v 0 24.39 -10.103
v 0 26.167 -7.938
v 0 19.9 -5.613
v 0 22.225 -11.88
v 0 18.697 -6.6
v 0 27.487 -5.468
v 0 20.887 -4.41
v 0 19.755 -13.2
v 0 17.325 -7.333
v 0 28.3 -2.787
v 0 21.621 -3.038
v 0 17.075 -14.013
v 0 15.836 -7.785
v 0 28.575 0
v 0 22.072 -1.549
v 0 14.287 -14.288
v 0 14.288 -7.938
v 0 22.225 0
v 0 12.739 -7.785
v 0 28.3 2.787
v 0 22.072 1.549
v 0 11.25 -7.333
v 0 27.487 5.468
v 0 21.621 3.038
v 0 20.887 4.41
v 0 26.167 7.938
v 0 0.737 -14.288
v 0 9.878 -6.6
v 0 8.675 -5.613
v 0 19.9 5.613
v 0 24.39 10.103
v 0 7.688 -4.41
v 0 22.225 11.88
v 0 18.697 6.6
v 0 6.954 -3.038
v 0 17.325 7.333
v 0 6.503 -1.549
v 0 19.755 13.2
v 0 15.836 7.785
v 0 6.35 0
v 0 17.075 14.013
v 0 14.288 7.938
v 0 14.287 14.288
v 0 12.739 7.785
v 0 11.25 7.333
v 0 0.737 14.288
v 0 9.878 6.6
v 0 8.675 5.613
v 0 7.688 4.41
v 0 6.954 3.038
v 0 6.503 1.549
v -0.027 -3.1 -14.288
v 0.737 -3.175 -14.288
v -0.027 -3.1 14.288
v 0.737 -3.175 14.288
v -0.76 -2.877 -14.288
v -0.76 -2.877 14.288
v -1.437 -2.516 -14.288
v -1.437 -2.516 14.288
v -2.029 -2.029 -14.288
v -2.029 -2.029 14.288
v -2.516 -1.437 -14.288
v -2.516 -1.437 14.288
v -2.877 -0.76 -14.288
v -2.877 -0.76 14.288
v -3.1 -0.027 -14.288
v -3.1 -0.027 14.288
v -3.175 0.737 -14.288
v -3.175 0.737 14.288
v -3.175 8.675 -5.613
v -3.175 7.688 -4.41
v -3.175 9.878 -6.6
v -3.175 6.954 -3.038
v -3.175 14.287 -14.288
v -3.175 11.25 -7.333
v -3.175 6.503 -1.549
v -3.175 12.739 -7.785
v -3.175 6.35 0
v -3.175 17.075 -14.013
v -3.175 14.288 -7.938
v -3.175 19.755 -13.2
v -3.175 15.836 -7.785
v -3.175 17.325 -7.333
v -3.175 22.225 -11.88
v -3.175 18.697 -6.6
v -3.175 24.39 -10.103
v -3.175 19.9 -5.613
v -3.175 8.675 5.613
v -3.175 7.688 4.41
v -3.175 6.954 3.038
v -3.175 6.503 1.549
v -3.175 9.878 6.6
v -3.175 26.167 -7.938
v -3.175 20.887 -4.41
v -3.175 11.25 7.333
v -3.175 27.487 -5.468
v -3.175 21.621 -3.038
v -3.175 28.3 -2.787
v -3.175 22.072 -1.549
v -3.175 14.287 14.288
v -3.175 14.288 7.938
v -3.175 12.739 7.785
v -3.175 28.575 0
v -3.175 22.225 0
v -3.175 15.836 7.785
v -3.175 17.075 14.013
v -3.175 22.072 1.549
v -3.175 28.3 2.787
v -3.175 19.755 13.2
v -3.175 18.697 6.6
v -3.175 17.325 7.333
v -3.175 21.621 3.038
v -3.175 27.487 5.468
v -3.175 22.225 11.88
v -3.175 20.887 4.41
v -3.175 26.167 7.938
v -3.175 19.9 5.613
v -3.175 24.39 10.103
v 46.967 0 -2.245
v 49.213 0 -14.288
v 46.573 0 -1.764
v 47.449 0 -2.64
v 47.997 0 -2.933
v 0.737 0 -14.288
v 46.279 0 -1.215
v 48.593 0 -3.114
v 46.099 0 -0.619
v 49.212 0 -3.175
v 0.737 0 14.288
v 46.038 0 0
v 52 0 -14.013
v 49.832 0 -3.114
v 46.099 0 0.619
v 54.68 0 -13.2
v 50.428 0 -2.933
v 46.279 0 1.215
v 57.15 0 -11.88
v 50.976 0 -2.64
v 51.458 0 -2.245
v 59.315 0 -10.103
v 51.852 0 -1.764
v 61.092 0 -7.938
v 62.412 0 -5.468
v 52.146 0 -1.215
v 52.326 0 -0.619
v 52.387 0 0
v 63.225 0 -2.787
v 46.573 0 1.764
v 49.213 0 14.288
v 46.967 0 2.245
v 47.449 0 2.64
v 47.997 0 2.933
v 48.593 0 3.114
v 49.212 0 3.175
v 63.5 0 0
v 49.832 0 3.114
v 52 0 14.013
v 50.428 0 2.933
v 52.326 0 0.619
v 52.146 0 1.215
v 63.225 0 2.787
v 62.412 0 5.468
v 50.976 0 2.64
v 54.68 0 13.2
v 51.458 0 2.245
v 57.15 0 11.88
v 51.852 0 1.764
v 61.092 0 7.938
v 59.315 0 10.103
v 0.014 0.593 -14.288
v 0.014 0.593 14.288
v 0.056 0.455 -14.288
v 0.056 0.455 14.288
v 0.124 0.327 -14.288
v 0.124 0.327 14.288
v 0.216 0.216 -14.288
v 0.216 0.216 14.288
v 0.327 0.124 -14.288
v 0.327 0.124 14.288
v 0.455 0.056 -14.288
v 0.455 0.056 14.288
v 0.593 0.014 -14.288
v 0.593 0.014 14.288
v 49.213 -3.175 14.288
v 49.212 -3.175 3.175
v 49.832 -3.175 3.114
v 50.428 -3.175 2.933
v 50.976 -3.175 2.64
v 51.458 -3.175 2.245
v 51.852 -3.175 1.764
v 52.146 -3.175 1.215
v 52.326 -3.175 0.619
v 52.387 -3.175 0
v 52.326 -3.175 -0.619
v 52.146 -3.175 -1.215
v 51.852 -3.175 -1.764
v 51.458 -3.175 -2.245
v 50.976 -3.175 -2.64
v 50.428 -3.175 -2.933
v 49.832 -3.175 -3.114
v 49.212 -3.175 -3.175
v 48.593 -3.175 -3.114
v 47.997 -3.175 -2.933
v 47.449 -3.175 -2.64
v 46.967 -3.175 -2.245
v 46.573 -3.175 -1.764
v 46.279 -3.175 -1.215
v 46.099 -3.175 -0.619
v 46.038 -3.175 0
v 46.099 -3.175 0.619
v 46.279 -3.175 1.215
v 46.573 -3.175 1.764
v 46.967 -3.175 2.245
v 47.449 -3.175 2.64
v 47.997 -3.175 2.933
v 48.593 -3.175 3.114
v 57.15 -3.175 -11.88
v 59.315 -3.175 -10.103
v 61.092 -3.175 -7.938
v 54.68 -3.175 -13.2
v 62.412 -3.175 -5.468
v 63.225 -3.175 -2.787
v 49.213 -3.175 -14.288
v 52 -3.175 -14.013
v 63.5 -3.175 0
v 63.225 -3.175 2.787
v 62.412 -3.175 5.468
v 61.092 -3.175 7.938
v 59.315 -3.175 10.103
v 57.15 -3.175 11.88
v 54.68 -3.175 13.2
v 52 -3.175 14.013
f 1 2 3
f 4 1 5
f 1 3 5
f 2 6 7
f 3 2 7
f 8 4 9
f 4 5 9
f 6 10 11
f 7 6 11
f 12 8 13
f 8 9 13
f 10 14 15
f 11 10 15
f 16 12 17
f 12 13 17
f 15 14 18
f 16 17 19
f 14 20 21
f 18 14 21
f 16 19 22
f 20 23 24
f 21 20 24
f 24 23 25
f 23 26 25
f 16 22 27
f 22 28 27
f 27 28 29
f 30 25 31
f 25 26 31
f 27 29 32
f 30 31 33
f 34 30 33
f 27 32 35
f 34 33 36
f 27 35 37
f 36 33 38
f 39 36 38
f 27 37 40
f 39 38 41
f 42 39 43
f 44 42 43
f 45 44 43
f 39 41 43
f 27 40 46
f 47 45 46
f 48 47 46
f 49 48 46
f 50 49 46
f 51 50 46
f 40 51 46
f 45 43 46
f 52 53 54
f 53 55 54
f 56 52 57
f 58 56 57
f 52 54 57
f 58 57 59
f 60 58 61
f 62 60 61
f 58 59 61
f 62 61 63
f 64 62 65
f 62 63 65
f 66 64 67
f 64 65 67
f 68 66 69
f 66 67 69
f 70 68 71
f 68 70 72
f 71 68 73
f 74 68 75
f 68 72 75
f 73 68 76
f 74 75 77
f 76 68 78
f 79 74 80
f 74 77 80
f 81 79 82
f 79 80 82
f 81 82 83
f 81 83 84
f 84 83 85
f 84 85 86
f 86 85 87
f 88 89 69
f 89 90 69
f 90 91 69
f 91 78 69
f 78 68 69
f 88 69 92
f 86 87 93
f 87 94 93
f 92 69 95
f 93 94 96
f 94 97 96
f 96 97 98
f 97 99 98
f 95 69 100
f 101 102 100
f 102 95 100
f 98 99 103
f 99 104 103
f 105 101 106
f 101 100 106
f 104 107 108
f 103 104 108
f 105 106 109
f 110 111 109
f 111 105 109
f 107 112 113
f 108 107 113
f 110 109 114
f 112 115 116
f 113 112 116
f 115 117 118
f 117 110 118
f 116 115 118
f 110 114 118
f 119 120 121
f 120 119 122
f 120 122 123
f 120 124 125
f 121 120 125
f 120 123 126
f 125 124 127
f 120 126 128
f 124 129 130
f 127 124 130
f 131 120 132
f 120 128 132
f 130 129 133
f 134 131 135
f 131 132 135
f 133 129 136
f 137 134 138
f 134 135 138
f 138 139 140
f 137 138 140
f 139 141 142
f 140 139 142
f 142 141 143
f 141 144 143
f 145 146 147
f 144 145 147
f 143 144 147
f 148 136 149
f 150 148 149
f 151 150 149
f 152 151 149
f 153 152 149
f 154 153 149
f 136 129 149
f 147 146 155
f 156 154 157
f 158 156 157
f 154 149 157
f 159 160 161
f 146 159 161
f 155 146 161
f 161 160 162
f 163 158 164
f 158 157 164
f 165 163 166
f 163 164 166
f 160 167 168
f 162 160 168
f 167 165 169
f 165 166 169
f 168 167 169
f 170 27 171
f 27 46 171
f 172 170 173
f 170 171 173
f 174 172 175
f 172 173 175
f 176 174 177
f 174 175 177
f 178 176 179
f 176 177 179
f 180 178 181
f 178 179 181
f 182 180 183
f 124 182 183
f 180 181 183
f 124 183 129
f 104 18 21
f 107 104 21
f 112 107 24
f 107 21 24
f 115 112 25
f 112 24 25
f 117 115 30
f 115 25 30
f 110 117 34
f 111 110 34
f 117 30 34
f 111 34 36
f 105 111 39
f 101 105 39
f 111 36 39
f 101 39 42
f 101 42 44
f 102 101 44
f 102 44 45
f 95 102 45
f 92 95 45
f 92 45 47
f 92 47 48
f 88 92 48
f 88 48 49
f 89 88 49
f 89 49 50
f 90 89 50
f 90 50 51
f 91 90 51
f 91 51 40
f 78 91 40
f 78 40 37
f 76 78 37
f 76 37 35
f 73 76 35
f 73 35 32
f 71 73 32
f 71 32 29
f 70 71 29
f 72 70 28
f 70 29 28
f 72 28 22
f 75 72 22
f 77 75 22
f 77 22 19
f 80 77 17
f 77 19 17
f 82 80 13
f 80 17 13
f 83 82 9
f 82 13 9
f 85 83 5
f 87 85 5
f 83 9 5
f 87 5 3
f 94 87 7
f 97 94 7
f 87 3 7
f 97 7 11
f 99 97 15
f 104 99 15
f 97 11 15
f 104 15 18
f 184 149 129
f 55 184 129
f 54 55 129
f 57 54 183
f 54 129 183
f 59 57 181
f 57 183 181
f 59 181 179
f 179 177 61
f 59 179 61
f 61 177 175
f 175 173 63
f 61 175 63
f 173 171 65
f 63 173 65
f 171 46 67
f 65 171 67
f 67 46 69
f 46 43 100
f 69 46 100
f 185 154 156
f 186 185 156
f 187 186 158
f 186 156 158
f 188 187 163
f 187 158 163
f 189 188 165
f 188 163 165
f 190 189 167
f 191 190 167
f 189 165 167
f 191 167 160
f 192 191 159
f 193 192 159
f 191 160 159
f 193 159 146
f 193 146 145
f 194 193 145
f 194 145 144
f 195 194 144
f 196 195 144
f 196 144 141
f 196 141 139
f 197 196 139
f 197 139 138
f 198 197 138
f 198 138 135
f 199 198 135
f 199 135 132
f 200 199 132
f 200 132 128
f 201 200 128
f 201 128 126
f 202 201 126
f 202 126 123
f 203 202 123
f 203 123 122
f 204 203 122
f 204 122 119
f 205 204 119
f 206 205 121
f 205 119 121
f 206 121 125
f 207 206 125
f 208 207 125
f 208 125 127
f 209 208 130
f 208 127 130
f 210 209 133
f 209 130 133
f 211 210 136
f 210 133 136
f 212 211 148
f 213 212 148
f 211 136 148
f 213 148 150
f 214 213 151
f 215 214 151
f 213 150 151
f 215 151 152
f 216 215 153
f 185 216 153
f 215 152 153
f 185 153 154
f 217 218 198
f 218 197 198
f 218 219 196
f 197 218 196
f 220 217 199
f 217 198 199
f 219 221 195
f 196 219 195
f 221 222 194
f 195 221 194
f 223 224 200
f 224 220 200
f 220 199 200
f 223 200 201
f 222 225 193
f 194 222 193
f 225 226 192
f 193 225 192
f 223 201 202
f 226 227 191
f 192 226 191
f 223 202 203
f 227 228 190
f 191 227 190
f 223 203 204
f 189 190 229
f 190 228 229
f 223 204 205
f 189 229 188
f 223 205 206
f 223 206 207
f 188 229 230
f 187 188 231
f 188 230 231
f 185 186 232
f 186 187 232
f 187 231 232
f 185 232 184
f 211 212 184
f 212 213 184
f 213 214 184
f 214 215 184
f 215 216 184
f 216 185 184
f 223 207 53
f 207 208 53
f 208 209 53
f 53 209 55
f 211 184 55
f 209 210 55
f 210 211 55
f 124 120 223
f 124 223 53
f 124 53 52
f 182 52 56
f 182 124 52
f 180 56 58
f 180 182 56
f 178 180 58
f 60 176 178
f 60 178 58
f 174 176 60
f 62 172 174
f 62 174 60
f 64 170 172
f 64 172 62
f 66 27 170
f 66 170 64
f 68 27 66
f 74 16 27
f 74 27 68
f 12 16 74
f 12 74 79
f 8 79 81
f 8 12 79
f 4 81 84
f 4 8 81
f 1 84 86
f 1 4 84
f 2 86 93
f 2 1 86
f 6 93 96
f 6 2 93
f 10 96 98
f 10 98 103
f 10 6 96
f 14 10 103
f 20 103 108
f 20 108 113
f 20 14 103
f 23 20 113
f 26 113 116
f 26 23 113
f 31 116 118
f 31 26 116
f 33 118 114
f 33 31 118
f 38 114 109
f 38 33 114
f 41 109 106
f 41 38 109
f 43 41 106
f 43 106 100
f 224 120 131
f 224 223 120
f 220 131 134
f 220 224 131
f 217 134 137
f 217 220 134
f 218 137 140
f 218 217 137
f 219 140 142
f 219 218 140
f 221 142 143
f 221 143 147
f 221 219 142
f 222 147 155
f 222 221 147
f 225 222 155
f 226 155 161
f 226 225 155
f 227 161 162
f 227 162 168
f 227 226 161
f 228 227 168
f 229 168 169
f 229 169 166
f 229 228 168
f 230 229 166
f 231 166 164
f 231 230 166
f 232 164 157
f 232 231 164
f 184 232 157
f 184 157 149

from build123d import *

# Parameters (mm, degrees)
BASE_FLANGE1_DEPTH = 14.2875
SKETCH8_R          = 7.9375
CUT_EXTRUDE3_DEPTH = 72.083846838
SKETCH7_R          = 3.175
CUT_EXTRUDE2_DEPTH = 72.083846838
FILLET1_RADIUS     = 14.2875
FILLET1_LENGTH     = 3.175
FILLET2_RADIUS     = 14.2875
FILLET2_LENGTH     = 3.175


# Sheet-metal steps are written as plain solids
with BuildPart() as part:
    # Sketch1 → Base-Flange1 (new, symmetric)
    with BuildSketch(Plane.XY):
        with BuildLine():
            Line((0, 28.575), (0, 0.7366))
            ThreePointArc((0, 0.7366), (0.215745145, 0.215745145), (0.7366, 0))
            Line((0.7366, 0), (63.5, 0))
            Line((63.5, 0), (63.5, -3.175))
            Line((63.5, -3.175), (0.7366, -3.175))
            ThreePointArc((0.7366, -3.175), (-2.029318885, -2.029318885), (-3.175, 0.7366))
            Line((-3.175, 0.7366), (-3.175, 28.575))
            Line((-3.175, 28.575), (0, 28.575))
        make_face()
    extrude(amount=BASE_FLANGE1_DEPTH, both=True)

    # Sketch8 → Cut-Extrude3 (cut, through all)
    with BuildSketch(Plane(origin=(0, 0, 0), x_dir=(0, 0, -1), z_dir=(1, 0, 0))):
        with Locations(Location((0, 14.2875, 0), (0, 0, 90))):
            Circle(SKETCH8_R)
    extrude(amount=-CUT_EXTRUDE3_DEPTH, mode=Mode.SUBTRACT)

    # Sketch7 → Cut-Extrude2 (cut, through all)
    with BuildSketch(Plane(origin=(0, 0, 0), x_dir=(1, 0, 0), z_dir=(0, 1, 0))):
        with Locations(Location((49.2125, 0, 0), (0, 0, 270))):
            Circle(SKETCH7_R)
    extrude(amount=-CUT_EXTRUDE2_DEPTH, mode=Mode.SUBTRACT)

    # Fillet1: full round fillet: the end face becomes a half cylinder, R = half its width
    fillet1_face = Plane((63.5, -1.5875, 0), x_dir=(0, -1, 0), z_dir=(1, 0, 0))  # on the end face: x along it, z out of the body
    fillet1_slab = fillet1_face.offset(-FILLET1_RADIUS / 2) * Box(FILLET1_LENGTH, 2 * FILLET1_RADIUS, FILLET1_RADIUS, mode=Mode.PRIVATE)  # the body's end, R deep
    fillet1_round = Plane((49.2125, -1.5875, 0), x_dir=(1, 0, 0), z_dir=(0, -1, 0)) * Cylinder(FILLET1_RADIUS, FILLET1_LENGTH, mode=Mode.PRIVATE)  # its axis R under the face
    add(fillet1_slab - fillet1_round, mode=Mode.SUBTRACT)

    # Fillet2: full round fillet: the end face becomes a half cylinder, R = half its width
    fillet2_face = Plane((-1.5875, 28.575, 0), x_dir=(1, 0, 0), z_dir=(0, 1, 0))  # on the end face: x along it, z out of the body
    fillet2_slab = fillet2_face.offset(-FILLET2_RADIUS / 2) * Box(FILLET2_LENGTH, 2 * FILLET2_RADIUS, FILLET2_RADIUS, mode=Mode.PRIVATE)  # the body's end, R deep
    fillet2_round = Plane((-1.5875, 14.2875, 0), x_dir=(0, 1, 0), z_dir=(1, 0, 0)) * Cylinder(FILLET2_RADIUS, FILLET2_LENGTH, mode=Mode.PRIVATE)  # its axis R under the face
    add(fillet2_slab - fillet2_round, mode=Mode.SUBTRACT)


solid = part.part
